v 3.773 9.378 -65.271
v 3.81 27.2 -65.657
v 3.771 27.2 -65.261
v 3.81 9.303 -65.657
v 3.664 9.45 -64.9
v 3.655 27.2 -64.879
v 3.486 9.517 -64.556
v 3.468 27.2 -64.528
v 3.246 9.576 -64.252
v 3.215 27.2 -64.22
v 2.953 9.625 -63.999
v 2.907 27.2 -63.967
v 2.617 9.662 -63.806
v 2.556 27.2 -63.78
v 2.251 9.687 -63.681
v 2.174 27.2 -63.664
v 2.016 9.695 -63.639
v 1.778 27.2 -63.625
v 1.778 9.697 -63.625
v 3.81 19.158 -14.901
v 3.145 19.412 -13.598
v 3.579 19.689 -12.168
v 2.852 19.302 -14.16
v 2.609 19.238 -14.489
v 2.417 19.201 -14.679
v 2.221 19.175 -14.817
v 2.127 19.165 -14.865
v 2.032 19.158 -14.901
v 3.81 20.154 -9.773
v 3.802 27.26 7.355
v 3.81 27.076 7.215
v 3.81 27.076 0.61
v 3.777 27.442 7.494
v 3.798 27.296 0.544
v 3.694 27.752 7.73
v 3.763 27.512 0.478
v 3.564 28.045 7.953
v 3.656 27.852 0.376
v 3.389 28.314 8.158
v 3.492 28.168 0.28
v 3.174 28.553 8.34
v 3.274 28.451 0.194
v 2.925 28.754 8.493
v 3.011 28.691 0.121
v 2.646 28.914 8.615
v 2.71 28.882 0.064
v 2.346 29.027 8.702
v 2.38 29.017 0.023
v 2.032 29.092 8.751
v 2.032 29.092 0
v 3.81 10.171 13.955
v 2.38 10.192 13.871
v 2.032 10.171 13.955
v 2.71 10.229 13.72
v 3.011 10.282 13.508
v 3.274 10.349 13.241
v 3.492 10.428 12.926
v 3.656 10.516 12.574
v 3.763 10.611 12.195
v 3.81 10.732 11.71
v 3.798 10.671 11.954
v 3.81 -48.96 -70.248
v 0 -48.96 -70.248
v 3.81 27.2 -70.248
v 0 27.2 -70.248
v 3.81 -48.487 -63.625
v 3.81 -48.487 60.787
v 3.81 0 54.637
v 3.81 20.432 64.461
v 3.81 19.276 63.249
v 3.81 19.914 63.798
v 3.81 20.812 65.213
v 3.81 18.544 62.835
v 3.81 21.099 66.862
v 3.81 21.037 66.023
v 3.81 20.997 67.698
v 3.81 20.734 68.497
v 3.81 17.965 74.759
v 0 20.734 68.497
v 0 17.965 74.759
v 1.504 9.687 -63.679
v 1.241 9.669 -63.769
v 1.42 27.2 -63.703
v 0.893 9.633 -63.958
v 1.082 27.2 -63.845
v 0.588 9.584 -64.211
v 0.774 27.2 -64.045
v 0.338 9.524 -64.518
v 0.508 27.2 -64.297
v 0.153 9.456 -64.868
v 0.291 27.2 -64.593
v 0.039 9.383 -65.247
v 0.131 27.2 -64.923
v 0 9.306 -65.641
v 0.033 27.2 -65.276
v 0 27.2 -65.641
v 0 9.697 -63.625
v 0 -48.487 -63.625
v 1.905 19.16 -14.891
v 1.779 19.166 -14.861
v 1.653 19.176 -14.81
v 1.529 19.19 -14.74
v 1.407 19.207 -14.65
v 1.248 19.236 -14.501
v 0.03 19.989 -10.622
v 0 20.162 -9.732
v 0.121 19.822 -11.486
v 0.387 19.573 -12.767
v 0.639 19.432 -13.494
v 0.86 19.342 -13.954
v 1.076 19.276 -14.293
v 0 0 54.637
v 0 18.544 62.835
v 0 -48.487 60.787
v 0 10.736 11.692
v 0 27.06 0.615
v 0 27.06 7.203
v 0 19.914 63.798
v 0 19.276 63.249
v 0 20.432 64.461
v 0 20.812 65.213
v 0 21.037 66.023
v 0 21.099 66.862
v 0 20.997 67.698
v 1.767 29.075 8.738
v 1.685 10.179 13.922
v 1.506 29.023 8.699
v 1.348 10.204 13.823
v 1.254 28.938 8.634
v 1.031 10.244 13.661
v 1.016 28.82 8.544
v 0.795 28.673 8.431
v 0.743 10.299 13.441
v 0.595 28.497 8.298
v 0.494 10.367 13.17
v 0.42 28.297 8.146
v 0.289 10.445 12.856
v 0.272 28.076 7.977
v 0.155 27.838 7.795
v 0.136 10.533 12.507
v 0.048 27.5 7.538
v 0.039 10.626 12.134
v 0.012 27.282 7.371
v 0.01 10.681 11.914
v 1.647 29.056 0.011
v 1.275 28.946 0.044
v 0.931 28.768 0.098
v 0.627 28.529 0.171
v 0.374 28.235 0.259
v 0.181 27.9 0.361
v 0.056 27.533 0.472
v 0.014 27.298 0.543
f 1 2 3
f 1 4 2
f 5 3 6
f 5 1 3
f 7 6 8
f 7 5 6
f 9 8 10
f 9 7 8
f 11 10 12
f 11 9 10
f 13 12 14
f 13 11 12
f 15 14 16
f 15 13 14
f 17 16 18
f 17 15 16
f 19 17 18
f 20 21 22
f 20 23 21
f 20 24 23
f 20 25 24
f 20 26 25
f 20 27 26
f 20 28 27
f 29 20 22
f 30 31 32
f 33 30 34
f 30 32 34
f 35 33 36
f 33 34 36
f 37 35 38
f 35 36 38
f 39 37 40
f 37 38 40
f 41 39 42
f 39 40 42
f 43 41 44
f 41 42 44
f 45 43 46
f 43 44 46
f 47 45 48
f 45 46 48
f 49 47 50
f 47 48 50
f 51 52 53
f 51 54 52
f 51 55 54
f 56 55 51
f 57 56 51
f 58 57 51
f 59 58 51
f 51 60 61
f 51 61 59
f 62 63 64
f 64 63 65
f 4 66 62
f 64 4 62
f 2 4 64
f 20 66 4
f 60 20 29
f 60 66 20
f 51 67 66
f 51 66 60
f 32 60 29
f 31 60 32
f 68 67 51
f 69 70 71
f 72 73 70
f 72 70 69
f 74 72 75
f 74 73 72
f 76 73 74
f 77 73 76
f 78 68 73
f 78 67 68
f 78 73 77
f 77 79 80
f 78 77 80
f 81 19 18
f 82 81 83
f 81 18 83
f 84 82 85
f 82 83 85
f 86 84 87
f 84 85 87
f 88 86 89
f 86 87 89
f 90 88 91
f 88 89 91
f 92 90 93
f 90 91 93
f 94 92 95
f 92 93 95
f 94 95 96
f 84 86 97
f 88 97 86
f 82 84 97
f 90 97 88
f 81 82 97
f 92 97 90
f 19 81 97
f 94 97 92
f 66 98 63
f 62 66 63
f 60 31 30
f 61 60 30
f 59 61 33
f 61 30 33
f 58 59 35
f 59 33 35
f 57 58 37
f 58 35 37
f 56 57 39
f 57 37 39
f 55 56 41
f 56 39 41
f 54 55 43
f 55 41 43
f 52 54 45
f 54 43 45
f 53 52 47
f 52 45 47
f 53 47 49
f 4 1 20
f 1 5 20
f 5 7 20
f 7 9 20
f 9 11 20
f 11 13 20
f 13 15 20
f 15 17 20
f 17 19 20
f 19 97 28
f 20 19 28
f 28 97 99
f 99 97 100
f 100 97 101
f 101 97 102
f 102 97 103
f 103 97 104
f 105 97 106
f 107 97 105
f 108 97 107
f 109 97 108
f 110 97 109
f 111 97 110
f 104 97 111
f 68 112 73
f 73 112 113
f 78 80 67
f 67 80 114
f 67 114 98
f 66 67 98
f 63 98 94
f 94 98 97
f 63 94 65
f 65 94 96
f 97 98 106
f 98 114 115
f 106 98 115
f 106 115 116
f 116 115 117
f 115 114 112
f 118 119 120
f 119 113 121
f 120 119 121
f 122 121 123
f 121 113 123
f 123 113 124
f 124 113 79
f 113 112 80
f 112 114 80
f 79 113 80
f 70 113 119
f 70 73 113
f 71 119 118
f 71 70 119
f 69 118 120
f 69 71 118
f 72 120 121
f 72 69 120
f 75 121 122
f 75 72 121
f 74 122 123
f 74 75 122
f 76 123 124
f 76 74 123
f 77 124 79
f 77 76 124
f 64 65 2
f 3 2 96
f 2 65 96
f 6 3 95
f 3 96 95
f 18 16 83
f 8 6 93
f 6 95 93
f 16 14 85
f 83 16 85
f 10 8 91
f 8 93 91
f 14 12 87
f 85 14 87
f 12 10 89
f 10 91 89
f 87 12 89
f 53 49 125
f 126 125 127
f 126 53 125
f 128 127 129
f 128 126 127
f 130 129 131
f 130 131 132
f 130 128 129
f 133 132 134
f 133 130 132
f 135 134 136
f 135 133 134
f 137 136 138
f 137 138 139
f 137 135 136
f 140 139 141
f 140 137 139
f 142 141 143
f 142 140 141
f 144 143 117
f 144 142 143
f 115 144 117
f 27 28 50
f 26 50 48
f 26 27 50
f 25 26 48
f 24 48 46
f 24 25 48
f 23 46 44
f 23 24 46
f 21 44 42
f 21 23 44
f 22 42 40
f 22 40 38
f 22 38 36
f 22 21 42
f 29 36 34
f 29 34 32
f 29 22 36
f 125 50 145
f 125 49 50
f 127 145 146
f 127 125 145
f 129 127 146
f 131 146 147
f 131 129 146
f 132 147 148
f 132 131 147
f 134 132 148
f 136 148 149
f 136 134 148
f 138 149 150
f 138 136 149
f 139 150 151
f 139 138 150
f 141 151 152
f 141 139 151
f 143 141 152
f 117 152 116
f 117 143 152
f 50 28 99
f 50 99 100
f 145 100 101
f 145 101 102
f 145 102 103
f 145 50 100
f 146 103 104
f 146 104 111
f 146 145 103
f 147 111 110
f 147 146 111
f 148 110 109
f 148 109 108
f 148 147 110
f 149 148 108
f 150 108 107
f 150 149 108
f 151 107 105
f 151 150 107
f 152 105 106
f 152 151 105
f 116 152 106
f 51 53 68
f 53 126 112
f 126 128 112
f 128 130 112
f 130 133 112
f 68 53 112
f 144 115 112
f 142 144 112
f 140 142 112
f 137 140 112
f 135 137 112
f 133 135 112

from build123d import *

# Parameters (mm, degrees)
F1_DEPTH     = 3.81
F2_R         = 4.2924717139
F3_R         = 2.032
F4_T4_DEPTH  = 27.583079529
F5_R         = 2.032
F6_T1_DEPTH  = 18.831700203
F6_T6_DEPTH  = 29.7046687957
F6_T11_DEPTH = 27.9890917976


# Not quite as in the source:
# - a fillet or chamfer that OpenCascade refuses, or shapes differently, is made with other operations: its cross-section is extruded or revolved along the edge and cut away or added


with BuildPart() as f1:
    # F0 (on Right) → F1 (new body)
    with BuildSketch(Plane.YZ):
        Polygon((-48.4873987734, 60.7866533101), (-48.4873987734, 33.8229238987), (-48.4873987734, 28.1463507563), (-48.4873987734, -63.624933362), (-48.9604510367, -70.247605443), (27.200255543, -70.247605443), (27.200255543, -63.624933362), (9.6974885091, -63.624933362), (19.158443436, -14.901005663), (29.0924459696, 0), (29.0924459696, 8.7513877079), (10.1705361158, 13.954914175), (0, 54.6370334923), (22.4697776139, 64.5710304379), (17.9654553963, 74.7593885665), align=None)
    extrude(amount=F1_DEPTH)

    # F2
    f2_edges = [f1.edges().sort_by_distance(p)[0] for p in [
        (1.905, 22.469778, 64.57103),
    ]]
    fillet(f2_edges, radius=F2_R)

    # F3
    f3_edges = [f1.edges().sort_by_distance(p)[0] for p in [
        (3.81, 18.448872, -63.624933),
    ]]
    fillet(f3_edges, radius=F3_R)

    # F4: fillet of radius 2.032 on 1 edges, made by hand


with BuildPart() as f4_tool2:
    # F4_s3 → F4_t4 (new body)
    with BuildSketch(Plane.XZ.offset(-32.2404117906)):
        with BuildLine():
            ThreePointArc((1.778, -63.624933362), (0.508, -64.296954195), (0, -65.640995861))
            Line((0, -65.640995861), (0, -63.624933362))
            Line((0, -63.624933362), (1.778, -63.624933362))
        make_face()
    extrude(amount=F4_T4_DEPTH)

    split(bisect_by=Plane(origin=(0, 21.2506127093, -4.1263317328), x_dir=(1, 0, 0), z_dir=(0, 0.981664966, -0.1906145181)), keep=Keep.TOP)


with BuildPart() as f1_1:
    add(f1.part)

    # F4_t1: cut F4_tool2
    add(f4_tool2.part, mode=Mode.SUBTRACT)

    # F5
    f5_edges = [f1_1.edges().sort_by_distance(p)[0] for p in [
        (0, 24.125445, -7.450503),
        (0, 29.092446, 4.375694),
        (0, 19.631491, 11.353151),
    ]]
    fillet(f5_edges, radius=F5_R)

    # F6: fillet of radius 2.032 on 3 edges, made by hand

    # F6_s2 → F6_t1 (cut)
    with BuildSketch(Plane.XY.offset(-5.0401562476)):
        with BuildLine():
            ThreePointArc((3.81, 27.0763834706), (3.302, 28.4204251366), (2.032, 29.0924459696))
            Line((2.032, 29.0924459696), (2.03708, 29.1327672196))
            ThreePointArc((2.03708, 29.1327672196), (2.921, 29.1330859696), (3.81, 29.1330859696))
            Line((3.81, 29.1330859696), (3.85064, 29.0924459696))
            Line((3.85064, 29.0924459696), (3.85064, 27.0763834706))
            Line((3.85064, 27.0763834706), (3.81, 27.0763834706))
        make_face()
    extrude(amount=F6_T1_DEPTH, mode=Mode.SUBTRACT)


with BuildPart() as f6_tool4:
    # F6_s5 → F6_t6 (new body)
    with BuildSketch(Plane(origin=(0, 29.6693335374, -8.1590686942), x_dir=(1, 0, 0), z_dir=(0, -0.9642053764, 0.2651565426))):
        with BuildLine():
            ThreePointArc((3.81, 14.1361249687), (3.302, 15.4801666347), (2.032, 16.1521874677))
            Line((2.032, 16.1521874677), (2.03708, 16.1925087177))
            ThreePointArc((2.03708, 16.1925087177), (2.921, 16.1928274677), (3.81, 16.1928274677))
            Line((3.81, 16.1928274677), (3.85064, 16.1521874677))
            Line((3.85064, 16.1521874677), (3.85064, 14.1361249687))
            Line((3.85064, 14.1361249687), (3.81, 14.1361249687))
        make_face()
    extrude(amount=F6_T6_DEPTH)

    split(bisect_by=Plane(origin=(0, 12.8557795978, 3.213946886), x_dir=(1, 0, 0), z_dir=(0, 0.9701424649, 0.2425357661)), keep=Keep.TOP)


with BuildPart() as f1_2:
    add(f1_1.part)

    # F6_t3: cut F6_tool4
    add(f6_tool4.part, mode=Mode.SUBTRACT)


with BuildPart() as f6_tool9:
    # F6_s10 → F6_t11 (new body)
    with BuildSketch(Plane(origin=(0, -3.7782576637, -5.6673872039), x_dir=(1, 0, 0), z_dir=(0, 0.5547001482, 0.8320503263))):
        with BuildLine():
            ThreePointArc((2.032, 24.206379163), (3.302, 23.53435833), (3.81, 22.190316664))
            Line((3.81, 22.190316664), (3.85064, 22.190316664))
            Line((3.85064, 22.190316664), (3.85064, 24.206379163))
            Line((3.85064, 24.206379163), (3.81, 24.247019163))
            ThreePointArc((3.81, 24.247019163), (2.921, 24.247019163), (2.03708, 24.246700413))
            Line((2.03708, 24.246700413), (2.032, 24.206379163))
        make_face()
    extrude(amount=F6_T11_DEPTH)

    split(bisect_by=Plane(origin=(0, 21.2506127093, -4.1263317328), x_dir=(1, 0, 0), z_dir=(0, 0.981664966, -0.1906145181)), keep=Keep.TOP)


with BuildPart() as f1_3:
    add(f1_2.part)

    # F6_t8: cut F6_tool9
    add(f6_tool9.part, mode=Mode.SUBTRACT)


solid = f1_3.part
